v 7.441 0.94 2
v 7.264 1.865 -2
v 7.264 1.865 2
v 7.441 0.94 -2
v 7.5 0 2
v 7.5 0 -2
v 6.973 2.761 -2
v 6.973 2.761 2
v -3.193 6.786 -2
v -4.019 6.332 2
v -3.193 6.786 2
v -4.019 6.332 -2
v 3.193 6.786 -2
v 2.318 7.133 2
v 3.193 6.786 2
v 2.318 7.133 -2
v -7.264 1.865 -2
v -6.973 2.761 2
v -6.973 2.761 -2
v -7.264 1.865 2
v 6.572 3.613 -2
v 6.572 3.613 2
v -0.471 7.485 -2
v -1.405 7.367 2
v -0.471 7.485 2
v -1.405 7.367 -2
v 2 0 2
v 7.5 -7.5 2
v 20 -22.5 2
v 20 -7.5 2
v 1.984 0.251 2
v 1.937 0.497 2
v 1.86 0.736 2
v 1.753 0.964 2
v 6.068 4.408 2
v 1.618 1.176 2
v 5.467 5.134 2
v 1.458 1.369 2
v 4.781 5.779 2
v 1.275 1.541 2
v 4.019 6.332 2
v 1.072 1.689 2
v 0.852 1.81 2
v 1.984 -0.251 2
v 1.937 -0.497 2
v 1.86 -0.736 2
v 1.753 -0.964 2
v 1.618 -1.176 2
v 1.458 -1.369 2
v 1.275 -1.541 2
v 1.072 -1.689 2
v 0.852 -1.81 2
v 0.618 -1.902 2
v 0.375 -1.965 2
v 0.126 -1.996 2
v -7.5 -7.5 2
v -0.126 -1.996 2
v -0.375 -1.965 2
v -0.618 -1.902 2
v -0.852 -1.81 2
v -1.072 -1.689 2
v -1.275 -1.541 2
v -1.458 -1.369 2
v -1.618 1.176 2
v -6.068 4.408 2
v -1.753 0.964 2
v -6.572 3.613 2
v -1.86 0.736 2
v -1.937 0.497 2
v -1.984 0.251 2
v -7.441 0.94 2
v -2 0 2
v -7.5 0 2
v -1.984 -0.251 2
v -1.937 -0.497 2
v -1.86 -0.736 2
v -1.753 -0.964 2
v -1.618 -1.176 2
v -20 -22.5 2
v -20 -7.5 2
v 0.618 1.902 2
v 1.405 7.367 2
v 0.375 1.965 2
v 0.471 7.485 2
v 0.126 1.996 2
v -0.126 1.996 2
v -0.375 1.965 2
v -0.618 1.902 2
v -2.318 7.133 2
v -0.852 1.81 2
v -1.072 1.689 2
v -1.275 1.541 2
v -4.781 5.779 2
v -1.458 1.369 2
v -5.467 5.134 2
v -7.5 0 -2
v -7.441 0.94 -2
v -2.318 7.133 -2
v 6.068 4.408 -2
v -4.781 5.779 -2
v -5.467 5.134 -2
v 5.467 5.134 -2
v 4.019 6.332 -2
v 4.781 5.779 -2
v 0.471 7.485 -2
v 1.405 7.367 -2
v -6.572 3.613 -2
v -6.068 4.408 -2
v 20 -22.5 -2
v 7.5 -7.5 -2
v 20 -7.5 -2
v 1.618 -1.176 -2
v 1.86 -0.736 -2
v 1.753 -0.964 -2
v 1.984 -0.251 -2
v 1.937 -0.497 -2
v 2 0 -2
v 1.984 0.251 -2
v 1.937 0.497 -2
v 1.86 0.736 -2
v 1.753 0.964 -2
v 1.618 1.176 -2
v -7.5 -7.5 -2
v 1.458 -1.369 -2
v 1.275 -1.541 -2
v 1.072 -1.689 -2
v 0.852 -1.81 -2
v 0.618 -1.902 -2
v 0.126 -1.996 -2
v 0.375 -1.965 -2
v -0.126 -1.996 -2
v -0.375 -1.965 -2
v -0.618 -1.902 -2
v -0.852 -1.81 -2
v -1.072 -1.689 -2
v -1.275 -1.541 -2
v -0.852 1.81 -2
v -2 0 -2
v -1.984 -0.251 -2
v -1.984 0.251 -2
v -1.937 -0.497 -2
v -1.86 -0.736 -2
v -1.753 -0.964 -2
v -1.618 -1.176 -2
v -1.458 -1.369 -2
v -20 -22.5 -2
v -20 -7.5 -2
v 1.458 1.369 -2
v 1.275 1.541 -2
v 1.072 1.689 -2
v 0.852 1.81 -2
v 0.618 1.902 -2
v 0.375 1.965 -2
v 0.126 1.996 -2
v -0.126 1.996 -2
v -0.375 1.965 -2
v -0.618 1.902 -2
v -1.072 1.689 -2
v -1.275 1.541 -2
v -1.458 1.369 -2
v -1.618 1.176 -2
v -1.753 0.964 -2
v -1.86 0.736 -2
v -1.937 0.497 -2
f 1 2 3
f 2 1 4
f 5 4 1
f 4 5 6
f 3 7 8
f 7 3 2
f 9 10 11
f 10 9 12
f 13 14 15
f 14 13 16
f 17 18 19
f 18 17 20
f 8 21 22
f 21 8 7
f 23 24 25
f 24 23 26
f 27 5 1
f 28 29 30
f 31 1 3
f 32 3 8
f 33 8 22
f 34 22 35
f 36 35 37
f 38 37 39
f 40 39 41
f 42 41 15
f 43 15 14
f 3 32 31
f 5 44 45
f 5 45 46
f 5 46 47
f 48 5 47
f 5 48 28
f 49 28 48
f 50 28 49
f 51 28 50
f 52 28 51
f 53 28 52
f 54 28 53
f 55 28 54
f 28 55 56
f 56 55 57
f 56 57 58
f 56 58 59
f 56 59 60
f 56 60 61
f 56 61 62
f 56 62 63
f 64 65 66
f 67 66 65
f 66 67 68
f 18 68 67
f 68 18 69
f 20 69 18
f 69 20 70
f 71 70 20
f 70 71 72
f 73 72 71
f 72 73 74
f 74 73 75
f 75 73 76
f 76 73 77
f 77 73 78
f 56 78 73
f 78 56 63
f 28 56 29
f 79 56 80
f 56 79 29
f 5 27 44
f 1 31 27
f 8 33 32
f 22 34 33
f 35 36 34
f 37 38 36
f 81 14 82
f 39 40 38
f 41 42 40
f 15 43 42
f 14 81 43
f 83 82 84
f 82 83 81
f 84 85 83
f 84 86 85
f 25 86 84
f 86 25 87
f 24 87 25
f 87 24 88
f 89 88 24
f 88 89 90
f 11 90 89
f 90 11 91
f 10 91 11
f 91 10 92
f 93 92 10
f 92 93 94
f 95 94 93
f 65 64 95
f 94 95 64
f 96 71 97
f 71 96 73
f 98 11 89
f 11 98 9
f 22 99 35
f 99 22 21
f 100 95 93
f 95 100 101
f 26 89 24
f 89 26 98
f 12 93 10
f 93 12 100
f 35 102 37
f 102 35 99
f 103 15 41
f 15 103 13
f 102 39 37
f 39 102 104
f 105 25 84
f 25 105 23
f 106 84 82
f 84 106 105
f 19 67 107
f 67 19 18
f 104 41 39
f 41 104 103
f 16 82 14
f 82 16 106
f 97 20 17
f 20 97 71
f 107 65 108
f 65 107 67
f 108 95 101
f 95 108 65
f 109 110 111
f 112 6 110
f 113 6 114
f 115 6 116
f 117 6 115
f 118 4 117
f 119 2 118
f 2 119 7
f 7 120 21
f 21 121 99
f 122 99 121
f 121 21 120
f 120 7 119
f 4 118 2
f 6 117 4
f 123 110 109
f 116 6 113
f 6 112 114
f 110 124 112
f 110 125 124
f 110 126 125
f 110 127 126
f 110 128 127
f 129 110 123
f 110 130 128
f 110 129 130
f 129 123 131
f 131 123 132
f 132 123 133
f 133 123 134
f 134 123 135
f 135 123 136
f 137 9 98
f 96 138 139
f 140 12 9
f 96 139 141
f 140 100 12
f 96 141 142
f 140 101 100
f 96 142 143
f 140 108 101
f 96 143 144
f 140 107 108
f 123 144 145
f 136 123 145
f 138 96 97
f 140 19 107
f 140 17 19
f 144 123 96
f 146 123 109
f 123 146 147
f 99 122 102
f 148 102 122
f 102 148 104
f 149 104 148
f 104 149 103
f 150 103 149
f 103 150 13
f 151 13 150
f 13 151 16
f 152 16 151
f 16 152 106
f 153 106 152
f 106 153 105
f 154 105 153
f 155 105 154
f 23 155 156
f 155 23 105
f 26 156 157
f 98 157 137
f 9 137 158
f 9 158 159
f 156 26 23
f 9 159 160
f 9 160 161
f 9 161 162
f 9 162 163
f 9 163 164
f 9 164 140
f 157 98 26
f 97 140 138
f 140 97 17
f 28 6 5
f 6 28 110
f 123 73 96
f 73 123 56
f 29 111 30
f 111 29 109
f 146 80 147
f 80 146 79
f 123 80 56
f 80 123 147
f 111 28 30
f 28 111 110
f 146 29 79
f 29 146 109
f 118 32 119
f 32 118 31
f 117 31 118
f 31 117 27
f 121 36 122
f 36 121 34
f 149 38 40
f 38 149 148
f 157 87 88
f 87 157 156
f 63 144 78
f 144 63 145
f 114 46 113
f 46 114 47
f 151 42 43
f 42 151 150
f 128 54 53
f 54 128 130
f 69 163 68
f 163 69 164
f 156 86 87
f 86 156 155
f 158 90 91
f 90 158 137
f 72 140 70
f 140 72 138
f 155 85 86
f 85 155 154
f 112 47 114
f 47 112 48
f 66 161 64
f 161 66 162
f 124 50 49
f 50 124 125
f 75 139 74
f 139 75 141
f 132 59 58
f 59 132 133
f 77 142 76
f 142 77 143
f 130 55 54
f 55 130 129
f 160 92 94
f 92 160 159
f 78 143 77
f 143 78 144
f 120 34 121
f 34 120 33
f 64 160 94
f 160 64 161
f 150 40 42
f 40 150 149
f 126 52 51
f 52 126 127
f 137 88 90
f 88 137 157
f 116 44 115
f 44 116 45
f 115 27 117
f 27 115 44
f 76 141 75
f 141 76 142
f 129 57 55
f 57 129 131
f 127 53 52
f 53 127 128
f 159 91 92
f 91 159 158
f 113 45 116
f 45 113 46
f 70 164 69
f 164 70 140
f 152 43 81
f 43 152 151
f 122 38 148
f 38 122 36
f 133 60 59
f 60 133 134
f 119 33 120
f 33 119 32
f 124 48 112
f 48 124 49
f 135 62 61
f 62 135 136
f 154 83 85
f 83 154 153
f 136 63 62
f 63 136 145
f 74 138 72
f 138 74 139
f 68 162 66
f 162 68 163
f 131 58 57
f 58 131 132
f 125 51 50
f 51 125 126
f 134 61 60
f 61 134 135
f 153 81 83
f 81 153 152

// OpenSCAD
// Tab thickness
tab_thickness = 4;

// Width of the sticky-uppy-bit
tab_width = 15;

// Width of the bit that bears the weight
tab_shoulder = 40;

// Screw hold diameter
screw_diameter = 4;

/* [Hidden] */
tab_radius = tab_width / 2;
screw_radius = screw_diameter / 2;

$fn = 50;

module tab() {
  difference() {
    union() {
      cylinder(h = tab_thickness, r = tab_radius, center = true);
      translate([0, -tab_radius, 0]) {
        cube([tab_width, tab_width, tab_thickness], center = true);
      }
      translate([0, -tab_width, 0]) {
        cube([tab_shoulder, tab_width, tab_thickness], center = true);
      }
    }
    cylinder(h = tab_thickness + 1, r = screw_radius, center = true);
  }
}

tab();
